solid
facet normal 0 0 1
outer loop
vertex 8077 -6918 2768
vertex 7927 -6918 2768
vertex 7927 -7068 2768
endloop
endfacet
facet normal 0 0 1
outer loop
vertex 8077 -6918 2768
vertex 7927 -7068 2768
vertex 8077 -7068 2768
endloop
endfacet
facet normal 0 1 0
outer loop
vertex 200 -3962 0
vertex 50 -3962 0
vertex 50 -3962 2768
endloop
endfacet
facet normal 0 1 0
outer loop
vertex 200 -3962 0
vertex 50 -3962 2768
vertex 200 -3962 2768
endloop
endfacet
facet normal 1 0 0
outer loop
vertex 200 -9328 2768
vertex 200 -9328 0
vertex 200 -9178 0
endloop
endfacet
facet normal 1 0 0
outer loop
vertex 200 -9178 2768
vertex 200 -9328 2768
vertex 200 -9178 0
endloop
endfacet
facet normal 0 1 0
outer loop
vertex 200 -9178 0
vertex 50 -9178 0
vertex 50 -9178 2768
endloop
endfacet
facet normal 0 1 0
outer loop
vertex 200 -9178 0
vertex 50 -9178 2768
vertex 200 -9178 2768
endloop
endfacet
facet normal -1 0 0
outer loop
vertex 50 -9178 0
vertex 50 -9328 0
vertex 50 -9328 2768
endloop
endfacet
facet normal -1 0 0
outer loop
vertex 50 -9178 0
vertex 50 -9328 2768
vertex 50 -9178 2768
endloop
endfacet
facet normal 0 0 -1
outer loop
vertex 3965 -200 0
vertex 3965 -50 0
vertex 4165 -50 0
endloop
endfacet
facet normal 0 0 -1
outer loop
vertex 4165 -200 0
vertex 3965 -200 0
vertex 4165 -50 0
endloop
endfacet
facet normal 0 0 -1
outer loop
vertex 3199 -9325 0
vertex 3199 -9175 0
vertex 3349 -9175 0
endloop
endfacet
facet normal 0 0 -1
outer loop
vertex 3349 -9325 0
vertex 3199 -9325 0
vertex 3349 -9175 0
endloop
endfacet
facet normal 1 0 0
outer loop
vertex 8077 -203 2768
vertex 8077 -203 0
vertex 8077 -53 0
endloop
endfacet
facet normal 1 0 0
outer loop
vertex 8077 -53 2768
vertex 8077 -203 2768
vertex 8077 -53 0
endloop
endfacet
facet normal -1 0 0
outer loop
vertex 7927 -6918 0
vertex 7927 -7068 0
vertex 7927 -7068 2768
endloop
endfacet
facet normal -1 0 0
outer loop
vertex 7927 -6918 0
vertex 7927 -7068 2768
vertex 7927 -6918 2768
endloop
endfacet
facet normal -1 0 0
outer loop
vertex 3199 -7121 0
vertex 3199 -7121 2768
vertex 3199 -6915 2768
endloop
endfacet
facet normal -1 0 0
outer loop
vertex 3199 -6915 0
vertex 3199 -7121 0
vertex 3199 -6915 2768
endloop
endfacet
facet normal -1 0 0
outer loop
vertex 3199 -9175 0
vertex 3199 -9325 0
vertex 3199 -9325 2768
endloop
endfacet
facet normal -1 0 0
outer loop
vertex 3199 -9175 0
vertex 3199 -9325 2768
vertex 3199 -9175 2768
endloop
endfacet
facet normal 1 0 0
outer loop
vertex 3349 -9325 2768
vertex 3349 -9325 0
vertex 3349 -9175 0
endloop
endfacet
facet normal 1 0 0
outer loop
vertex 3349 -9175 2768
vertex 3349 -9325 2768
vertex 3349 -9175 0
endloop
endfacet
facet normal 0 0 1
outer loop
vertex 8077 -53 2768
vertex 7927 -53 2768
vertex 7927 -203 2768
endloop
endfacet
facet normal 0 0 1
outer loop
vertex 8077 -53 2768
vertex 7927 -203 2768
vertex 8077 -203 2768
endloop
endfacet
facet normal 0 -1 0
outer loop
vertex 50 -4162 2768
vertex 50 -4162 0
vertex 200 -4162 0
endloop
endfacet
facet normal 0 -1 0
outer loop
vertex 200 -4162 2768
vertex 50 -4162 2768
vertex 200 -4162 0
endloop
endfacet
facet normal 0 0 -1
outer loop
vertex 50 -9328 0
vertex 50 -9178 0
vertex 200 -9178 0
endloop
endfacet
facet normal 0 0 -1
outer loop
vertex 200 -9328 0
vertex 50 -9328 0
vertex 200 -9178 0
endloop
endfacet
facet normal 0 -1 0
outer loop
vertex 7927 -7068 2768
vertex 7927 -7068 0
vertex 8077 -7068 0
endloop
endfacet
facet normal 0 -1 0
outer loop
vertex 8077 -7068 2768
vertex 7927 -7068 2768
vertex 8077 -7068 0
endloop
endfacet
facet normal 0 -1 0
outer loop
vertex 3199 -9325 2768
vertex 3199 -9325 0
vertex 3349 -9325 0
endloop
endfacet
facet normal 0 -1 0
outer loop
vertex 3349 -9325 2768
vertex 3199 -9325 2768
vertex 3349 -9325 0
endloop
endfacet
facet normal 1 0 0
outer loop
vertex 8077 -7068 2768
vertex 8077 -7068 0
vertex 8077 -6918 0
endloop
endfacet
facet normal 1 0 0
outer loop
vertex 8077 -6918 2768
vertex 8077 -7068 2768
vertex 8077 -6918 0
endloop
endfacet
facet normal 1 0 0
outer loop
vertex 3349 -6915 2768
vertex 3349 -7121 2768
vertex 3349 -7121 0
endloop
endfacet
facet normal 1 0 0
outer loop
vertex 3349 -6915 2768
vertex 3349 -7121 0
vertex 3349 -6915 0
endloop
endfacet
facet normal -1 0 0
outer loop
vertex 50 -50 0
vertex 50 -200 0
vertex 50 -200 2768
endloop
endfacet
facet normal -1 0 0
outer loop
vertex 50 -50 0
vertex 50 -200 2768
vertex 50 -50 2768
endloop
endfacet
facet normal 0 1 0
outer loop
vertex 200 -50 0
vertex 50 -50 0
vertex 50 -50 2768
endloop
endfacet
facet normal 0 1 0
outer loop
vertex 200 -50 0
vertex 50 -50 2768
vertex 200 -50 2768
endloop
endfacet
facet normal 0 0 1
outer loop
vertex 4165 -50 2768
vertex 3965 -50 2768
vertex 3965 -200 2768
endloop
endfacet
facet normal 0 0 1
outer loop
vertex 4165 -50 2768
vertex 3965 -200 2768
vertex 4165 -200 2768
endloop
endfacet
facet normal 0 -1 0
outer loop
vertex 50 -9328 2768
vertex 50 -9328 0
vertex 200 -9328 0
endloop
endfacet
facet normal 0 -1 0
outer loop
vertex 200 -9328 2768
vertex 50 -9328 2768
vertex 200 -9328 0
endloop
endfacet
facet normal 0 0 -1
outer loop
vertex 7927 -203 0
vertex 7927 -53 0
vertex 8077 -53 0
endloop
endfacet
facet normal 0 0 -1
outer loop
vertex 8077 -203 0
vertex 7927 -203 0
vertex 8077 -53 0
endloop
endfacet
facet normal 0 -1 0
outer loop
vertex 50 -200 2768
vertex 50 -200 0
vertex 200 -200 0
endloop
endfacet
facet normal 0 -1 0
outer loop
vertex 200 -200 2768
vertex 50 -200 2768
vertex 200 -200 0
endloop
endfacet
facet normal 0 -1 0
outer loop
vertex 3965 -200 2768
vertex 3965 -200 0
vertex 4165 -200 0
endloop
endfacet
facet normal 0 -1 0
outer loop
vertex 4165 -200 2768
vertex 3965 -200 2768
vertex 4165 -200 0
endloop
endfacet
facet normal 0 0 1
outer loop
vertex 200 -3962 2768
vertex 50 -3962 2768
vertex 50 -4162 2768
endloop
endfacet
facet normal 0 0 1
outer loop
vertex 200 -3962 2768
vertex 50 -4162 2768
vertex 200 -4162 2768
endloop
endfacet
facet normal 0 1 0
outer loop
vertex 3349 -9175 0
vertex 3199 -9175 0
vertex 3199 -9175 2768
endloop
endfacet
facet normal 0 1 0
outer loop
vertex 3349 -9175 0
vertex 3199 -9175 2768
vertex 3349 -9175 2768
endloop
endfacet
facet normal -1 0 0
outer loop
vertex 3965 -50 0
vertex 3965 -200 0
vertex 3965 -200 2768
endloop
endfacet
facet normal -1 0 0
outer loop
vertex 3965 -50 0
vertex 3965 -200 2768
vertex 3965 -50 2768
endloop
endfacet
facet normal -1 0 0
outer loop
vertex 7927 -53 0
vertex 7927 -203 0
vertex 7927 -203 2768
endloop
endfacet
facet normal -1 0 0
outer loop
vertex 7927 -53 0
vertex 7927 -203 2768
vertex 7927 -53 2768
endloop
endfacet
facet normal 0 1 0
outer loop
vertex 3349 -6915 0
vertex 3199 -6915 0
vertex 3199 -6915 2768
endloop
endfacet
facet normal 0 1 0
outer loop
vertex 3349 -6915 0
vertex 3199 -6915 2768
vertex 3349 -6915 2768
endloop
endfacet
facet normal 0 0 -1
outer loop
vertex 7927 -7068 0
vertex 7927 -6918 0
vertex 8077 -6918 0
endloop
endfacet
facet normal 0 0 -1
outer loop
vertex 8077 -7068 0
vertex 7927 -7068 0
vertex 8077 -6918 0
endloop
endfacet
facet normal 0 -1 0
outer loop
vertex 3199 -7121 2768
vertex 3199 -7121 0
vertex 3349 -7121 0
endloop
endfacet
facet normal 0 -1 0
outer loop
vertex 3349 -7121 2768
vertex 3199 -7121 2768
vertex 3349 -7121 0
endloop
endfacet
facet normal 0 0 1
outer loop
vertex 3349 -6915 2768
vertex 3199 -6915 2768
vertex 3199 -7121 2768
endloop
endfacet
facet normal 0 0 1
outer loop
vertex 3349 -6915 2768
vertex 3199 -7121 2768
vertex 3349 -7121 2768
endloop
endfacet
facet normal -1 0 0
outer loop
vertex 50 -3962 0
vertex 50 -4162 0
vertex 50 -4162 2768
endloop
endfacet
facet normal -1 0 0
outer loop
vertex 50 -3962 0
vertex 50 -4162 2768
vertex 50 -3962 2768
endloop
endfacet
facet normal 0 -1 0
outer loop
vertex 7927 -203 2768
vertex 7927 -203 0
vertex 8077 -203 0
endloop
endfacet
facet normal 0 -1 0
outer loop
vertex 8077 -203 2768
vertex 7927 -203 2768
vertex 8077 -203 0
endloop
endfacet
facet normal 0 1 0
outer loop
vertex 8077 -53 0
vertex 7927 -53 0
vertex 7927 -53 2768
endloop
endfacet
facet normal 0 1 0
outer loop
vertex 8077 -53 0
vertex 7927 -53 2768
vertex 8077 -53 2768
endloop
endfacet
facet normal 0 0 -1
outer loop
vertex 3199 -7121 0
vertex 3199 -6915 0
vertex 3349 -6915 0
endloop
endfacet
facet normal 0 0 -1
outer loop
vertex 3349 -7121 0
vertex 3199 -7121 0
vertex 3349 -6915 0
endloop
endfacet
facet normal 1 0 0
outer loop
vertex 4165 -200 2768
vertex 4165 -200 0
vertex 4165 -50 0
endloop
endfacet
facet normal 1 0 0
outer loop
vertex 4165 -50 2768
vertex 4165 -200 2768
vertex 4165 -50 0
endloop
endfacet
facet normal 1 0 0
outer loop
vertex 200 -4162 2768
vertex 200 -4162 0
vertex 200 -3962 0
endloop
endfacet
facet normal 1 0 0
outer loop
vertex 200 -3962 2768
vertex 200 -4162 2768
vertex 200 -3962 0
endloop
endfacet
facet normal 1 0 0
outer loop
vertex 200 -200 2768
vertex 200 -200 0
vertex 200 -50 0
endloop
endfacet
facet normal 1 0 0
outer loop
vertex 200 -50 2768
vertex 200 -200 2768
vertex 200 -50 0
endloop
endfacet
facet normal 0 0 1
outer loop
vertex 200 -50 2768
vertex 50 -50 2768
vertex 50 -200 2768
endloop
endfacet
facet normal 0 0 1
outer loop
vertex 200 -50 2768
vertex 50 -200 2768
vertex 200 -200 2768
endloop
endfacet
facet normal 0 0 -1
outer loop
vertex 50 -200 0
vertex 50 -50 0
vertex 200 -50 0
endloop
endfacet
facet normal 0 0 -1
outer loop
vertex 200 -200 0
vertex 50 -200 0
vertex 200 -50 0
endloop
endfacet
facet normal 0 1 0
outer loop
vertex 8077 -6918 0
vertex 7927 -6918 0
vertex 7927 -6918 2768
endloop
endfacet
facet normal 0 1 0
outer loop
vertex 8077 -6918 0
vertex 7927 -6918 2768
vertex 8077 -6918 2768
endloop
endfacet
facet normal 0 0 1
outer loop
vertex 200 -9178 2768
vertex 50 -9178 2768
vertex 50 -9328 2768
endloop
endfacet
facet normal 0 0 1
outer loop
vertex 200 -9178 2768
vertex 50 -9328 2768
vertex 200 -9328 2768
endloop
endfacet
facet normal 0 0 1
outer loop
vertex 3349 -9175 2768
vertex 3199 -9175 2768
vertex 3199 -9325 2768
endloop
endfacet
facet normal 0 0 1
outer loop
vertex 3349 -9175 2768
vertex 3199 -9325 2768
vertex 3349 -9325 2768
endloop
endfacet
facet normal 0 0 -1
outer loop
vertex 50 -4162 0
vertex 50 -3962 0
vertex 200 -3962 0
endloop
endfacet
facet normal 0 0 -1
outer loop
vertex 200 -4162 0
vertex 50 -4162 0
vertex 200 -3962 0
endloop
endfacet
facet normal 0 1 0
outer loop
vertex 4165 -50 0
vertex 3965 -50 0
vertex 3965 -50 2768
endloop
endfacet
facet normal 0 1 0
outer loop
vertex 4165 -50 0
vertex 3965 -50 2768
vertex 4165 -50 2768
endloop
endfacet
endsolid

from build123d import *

# Parameters (mm, degrees)
SKETCH_1_W        = 150
SKETCH_1_H        = 150
EXTRUDE_1_DEPTH   = 2768
SKETCH_1_W_2      = 200
EXTRUDE_1_2_DEPTH = 2768
EXTRUDE_1_3_DEPTH = 2768
SKETCH_1_H_2      = 206
EXTRUDE_1_4_DEPTH = 2768
EXTRUDE_1_5_DEPTH = 2768
EXTRUDE_1_6_DEPTH = 2768
EXTRUDE_1_7_DEPTH = 2768
SKETCH_1_H_3      = 200
EXTRUDE_1_8_DEPTH = 2768


with BuildPart() as part:
    # Эскиз1 → Бобышка-Вытянуть1 (new body)
    with BuildSketch(Plane.XY):
        with Locations((125, -125)):
            Rectangle(SKETCH_1_W, SKETCH_1_H)
    extrude(amount=EXTRUDE_1_DEPTH)


with BuildPart() as body_2:
    # Эскиз1 → Extrude 1 2 (new body)
    with BuildSketch(Plane.XY):
        with Locations((4065, -125)):
            Rectangle(SKETCH_1_W_2, SKETCH_1_H)
    extrude(amount=EXTRUDE_1_2_DEPTH)


with BuildPart() as body_3:
    # Эскиз1 → Extrude 1 3 (new body)
    with BuildSketch(Plane.XY):
        with Locations((8002, -128)):
            Rectangle(SKETCH_1_W, SKETCH_1_H)
    extrude(amount=EXTRUDE_1_3_DEPTH)


with BuildPart() as body_4:
    # Эскиз1 → Extrude 1 4 (new body)
    with BuildSketch(Plane.XY):
        with Locations((3274, -7018)):
            Rectangle(SKETCH_1_W, SKETCH_1_H_2)
    extrude(amount=EXTRUDE_1_4_DEPTH)


with BuildPart() as body_5:
    # Эскиз1 → Extrude 1 5 (new body)
    with BuildSketch(Plane.XY):
        with Locations((8002, -6993)):
            Rectangle(SKETCH_1_W, SKETCH_1_H)
    extrude(amount=EXTRUDE_1_5_DEPTH)


with BuildPart() as body_6:
    # Эскиз1 → Extrude 1 6 (new body)
    with BuildSketch(Plane.XY):
        with Locations((3274, -9250)):
            Rectangle(SKETCH_1_W, SKETCH_1_H)
    extrude(amount=EXTRUDE_1_6_DEPTH)


with BuildPart() as body_7:
    # Эскиз1 → Extrude 1 7 (new body)
    with BuildSketch(Plane.XY):
        with Locations((125, -9253)):
            Rectangle(SKETCH_1_W, SKETCH_1_H)
    extrude(amount=EXTRUDE_1_7_DEPTH)


with BuildPart() as body_8:
    # Эскиз1 → Extrude 1 8 (new body)
    with BuildSketch(Plane.XY):
        with Locations((125, -4062)):
            Rectangle(SKETCH_1_W, SKETCH_1_H_3)
    extrude(amount=EXTRUDE_1_8_DEPTH)


solid = Compound([part.part, body_2.part, body_3.part, body_4.part, body_5.part, body_6.part, body_7.part, body_8.part])
